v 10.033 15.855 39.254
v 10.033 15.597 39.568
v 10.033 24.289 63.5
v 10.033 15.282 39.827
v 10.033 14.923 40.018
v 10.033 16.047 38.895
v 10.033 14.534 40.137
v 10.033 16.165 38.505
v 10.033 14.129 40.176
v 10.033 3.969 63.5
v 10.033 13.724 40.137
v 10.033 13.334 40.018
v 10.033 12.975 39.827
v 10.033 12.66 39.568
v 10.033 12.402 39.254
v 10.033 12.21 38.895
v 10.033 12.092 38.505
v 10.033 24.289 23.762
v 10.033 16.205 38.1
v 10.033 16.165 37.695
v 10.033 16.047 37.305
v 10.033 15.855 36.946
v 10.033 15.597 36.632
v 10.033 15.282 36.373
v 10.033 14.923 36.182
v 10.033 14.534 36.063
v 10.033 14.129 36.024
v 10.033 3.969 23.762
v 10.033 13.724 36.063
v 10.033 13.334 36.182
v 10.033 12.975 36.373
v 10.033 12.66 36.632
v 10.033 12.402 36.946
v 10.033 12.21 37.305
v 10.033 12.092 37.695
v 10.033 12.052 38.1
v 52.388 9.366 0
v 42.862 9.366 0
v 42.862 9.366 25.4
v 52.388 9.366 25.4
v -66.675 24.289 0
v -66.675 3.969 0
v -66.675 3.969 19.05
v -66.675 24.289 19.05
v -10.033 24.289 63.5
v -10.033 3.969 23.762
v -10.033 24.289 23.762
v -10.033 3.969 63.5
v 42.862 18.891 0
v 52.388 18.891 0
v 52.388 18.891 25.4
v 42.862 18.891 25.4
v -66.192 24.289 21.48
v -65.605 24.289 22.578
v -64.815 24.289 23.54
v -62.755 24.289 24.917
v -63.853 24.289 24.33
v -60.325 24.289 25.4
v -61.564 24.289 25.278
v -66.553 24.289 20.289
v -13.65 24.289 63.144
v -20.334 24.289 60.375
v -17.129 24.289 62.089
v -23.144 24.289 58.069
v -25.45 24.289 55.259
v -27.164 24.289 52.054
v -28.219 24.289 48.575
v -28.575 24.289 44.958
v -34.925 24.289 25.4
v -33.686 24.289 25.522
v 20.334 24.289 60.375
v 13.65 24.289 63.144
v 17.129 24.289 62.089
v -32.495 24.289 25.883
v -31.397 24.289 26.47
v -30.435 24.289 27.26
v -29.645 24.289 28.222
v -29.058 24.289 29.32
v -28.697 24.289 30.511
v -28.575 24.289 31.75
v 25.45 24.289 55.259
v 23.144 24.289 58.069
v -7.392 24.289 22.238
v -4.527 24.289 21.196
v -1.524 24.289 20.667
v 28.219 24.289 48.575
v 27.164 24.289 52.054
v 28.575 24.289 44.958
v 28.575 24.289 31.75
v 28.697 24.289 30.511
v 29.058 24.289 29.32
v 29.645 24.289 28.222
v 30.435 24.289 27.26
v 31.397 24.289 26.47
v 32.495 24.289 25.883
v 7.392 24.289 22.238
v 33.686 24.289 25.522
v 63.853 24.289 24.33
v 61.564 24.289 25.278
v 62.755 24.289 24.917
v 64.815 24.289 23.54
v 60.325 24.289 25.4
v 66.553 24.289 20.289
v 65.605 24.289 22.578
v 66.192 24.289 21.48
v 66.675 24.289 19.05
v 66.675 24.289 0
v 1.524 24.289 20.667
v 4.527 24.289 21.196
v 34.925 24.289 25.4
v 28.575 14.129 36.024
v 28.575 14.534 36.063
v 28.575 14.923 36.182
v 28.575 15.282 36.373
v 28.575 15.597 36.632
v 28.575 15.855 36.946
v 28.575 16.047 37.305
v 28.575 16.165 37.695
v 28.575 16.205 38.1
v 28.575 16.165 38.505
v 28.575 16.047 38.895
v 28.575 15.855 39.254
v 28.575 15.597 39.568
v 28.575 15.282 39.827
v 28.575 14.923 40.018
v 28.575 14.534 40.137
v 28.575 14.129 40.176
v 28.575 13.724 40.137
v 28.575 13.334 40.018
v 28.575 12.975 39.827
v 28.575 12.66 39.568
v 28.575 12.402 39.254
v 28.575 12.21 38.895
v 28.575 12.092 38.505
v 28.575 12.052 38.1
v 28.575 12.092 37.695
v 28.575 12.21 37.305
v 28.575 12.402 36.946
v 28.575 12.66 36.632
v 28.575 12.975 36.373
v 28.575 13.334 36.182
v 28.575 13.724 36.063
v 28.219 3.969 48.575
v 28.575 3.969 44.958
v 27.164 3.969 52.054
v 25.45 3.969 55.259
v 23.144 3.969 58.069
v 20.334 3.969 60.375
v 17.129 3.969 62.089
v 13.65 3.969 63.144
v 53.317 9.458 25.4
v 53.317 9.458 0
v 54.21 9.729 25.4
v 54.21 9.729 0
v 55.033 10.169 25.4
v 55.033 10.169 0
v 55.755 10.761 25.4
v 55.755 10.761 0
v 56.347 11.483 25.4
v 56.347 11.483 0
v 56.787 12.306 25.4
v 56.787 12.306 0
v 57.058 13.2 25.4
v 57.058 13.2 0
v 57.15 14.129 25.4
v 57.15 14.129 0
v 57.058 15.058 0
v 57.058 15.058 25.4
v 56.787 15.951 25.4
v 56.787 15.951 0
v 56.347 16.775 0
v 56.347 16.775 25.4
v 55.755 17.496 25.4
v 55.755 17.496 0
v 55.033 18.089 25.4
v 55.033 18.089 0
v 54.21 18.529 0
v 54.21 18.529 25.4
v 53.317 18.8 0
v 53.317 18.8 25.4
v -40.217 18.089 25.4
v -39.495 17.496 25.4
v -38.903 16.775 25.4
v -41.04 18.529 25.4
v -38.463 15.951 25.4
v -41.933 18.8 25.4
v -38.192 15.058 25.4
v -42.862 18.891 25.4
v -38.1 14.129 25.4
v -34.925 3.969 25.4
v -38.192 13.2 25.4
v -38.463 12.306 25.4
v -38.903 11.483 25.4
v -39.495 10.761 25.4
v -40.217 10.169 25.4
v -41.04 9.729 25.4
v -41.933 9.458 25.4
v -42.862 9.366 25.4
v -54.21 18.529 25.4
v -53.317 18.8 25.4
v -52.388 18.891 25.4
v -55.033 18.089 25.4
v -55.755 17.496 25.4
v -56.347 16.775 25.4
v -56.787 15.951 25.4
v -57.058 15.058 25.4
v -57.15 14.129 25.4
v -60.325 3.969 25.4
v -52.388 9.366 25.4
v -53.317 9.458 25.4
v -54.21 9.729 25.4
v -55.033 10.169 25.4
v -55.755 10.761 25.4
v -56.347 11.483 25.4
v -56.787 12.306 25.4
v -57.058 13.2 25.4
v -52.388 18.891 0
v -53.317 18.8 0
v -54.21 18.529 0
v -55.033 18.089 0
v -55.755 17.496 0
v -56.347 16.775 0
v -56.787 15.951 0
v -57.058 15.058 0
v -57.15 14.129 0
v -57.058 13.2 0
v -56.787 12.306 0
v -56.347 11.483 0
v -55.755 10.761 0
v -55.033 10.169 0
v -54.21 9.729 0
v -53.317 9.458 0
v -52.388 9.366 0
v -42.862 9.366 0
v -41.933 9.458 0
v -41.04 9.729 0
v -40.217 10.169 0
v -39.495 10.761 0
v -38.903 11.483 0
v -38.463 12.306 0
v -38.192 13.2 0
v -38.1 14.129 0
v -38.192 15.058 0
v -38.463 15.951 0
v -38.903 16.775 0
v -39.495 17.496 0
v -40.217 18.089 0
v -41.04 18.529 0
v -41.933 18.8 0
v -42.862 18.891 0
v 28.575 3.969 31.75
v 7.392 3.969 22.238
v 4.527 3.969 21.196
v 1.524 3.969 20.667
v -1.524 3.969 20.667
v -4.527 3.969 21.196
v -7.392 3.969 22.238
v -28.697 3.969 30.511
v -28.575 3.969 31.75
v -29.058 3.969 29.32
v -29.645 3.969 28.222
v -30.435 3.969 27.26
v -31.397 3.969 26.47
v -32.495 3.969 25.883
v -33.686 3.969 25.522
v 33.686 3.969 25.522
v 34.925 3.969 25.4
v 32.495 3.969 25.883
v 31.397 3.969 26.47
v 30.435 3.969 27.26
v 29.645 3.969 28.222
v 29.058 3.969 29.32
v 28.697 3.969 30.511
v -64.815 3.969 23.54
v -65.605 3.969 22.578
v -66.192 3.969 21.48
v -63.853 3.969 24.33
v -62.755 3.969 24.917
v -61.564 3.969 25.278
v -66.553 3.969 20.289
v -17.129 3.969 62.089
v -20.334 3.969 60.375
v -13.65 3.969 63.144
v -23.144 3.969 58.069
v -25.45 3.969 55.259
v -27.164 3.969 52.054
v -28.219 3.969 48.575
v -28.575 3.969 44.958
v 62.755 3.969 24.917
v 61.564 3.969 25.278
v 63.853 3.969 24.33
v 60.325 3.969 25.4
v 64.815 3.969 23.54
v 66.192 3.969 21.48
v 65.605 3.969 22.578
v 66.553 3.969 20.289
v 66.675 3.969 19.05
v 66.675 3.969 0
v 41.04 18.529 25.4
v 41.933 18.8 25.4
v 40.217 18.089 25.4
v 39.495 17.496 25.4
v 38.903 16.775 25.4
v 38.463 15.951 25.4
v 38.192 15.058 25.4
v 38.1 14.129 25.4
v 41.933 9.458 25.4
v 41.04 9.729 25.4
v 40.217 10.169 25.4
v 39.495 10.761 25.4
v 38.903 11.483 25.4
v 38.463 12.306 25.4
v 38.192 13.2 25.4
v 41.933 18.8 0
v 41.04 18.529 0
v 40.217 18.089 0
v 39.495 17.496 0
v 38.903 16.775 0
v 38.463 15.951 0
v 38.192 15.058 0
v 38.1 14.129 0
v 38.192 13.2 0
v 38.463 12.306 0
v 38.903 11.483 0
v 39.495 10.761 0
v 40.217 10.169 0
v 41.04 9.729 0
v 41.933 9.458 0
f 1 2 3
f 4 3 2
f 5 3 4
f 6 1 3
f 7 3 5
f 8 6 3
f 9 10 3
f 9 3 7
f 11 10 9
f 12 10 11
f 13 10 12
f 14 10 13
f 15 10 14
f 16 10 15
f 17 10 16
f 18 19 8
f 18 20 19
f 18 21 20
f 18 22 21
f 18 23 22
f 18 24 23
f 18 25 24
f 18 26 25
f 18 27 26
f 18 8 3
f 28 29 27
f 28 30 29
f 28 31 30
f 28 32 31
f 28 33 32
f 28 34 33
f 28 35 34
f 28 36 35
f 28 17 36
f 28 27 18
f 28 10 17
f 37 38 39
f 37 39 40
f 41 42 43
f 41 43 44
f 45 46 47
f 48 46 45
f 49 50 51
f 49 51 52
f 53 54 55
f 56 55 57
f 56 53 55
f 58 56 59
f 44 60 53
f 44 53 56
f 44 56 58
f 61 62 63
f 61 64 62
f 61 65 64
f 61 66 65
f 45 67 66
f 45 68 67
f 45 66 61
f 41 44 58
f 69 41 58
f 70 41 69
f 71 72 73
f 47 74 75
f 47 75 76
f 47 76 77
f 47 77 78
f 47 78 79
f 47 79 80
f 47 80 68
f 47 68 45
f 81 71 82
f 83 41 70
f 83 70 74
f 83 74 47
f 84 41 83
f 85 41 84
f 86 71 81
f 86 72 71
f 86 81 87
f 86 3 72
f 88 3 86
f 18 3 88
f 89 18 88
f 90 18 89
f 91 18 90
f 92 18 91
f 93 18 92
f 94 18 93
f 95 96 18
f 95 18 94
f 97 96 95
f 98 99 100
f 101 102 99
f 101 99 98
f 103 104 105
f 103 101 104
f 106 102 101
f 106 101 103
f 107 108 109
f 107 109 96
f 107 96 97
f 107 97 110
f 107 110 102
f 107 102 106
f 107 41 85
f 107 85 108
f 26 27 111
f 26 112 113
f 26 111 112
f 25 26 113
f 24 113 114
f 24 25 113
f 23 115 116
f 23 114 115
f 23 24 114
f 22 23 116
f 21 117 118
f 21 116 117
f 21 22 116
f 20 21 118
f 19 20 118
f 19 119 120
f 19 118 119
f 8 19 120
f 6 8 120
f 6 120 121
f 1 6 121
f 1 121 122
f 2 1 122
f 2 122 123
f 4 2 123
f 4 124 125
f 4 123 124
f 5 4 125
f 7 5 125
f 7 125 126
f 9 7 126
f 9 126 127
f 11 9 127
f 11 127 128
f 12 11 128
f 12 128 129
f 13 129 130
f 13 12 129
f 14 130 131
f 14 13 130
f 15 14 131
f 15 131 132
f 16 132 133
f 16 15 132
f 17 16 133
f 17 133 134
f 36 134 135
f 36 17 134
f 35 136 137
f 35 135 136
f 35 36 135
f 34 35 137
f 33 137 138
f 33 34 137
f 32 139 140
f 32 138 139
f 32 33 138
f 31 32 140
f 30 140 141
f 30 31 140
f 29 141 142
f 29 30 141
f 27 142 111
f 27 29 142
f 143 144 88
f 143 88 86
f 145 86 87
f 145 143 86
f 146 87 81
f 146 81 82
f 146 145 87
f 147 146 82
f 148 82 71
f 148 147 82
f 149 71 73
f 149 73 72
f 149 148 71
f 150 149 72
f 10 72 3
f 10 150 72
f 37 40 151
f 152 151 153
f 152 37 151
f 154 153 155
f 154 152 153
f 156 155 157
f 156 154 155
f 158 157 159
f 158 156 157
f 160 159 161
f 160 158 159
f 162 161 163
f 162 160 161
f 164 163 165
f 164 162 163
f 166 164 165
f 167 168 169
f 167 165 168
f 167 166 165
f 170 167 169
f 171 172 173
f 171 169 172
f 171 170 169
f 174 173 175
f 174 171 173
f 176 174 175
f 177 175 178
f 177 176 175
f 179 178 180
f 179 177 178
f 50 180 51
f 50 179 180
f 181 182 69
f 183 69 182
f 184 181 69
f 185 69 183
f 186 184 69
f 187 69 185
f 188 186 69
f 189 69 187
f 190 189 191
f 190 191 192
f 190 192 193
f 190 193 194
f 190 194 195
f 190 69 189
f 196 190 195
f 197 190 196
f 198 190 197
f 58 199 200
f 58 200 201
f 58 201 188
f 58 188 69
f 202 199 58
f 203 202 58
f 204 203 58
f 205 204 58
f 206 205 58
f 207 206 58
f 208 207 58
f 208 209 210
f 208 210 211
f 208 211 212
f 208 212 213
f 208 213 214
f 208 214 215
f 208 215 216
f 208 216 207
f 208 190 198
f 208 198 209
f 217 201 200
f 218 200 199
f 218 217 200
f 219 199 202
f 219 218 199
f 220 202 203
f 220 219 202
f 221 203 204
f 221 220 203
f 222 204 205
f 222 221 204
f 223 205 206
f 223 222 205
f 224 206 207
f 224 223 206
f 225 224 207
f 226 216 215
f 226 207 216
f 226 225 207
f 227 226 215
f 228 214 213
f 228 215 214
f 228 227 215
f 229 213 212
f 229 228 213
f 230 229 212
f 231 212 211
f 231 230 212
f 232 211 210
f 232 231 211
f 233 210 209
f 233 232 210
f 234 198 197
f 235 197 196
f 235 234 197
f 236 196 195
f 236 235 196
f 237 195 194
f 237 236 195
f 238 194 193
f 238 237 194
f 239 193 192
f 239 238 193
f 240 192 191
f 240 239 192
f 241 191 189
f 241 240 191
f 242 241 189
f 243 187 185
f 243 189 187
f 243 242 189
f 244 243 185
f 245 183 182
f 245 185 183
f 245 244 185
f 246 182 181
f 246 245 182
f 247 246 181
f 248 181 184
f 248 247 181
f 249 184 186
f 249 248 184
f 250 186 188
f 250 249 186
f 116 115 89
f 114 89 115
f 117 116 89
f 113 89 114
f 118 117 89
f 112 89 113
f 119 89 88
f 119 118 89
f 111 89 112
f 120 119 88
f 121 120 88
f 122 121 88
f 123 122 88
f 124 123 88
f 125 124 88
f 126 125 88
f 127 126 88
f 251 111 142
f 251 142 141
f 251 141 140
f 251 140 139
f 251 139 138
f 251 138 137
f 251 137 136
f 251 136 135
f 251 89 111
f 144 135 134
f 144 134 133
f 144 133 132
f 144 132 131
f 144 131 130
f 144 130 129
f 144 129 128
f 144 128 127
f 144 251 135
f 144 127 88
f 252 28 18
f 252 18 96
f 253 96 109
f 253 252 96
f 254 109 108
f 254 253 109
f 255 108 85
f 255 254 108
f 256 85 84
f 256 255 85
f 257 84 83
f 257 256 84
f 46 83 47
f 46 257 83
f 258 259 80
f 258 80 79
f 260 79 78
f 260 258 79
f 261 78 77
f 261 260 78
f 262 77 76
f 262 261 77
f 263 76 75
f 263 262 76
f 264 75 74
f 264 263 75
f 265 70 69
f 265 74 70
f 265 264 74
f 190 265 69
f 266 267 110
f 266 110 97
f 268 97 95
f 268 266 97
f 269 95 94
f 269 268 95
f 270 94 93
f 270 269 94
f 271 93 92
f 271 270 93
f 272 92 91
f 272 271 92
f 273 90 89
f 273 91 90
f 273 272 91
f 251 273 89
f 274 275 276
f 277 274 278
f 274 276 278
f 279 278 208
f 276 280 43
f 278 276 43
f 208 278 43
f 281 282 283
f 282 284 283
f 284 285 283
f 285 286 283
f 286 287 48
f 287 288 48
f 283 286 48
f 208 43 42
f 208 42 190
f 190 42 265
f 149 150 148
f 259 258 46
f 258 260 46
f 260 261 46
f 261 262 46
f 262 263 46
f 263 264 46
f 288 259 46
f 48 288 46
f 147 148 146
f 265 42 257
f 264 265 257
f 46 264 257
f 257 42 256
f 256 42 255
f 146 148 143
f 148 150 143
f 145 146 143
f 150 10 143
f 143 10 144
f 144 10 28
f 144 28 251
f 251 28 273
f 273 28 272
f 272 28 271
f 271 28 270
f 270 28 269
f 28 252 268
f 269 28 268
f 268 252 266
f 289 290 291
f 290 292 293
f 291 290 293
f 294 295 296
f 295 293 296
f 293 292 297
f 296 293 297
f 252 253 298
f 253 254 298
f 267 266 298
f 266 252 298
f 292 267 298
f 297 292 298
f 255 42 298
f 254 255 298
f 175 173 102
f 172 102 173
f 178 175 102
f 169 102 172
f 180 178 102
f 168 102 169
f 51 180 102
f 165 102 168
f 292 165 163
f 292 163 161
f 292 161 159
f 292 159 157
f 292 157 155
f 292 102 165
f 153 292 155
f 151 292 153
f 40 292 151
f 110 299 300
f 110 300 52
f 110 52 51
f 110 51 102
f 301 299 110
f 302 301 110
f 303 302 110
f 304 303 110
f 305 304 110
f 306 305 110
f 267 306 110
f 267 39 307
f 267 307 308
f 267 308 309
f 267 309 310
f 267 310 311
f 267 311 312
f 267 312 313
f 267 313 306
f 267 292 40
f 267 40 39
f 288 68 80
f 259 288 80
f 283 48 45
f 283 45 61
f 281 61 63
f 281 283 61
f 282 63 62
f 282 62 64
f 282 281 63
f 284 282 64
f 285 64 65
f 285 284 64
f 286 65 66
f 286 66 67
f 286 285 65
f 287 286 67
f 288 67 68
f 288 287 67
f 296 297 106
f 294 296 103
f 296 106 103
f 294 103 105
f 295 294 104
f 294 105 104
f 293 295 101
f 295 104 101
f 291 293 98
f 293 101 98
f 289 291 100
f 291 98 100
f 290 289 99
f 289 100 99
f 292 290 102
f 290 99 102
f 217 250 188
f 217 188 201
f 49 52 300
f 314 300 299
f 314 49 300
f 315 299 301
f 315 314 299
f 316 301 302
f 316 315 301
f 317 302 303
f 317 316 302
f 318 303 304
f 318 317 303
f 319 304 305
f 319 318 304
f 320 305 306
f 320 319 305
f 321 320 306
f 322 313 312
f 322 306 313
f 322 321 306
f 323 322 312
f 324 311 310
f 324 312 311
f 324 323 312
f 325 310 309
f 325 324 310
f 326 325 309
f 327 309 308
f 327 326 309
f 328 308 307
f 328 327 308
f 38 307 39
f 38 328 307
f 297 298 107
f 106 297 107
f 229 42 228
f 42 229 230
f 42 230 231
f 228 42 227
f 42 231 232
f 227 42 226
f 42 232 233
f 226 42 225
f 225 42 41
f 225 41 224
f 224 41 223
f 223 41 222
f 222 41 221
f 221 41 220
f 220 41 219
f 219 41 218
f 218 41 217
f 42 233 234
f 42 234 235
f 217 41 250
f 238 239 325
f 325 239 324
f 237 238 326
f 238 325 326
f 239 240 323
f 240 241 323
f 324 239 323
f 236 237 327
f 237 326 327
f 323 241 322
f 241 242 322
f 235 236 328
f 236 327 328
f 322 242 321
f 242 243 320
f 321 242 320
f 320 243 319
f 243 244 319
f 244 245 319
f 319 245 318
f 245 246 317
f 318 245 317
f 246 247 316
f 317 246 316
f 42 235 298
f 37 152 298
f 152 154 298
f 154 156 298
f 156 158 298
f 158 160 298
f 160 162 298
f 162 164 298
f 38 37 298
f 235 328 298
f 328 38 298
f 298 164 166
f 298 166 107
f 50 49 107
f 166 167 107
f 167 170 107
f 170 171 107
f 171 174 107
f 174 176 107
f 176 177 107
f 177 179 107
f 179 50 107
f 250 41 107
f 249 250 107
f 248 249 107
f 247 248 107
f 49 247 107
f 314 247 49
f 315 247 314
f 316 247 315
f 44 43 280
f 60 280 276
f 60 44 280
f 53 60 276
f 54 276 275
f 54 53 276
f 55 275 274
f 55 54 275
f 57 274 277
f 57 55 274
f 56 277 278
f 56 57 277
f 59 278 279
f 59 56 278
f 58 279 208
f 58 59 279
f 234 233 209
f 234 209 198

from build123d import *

# Parameters (mm, degrees)
SKETCH1_W          = 133.35
SKETCH1_H          = 20.32
EXTRUDE1_DEPTH     = 63.5
CUT_EXTRUDE1_DEPTH = 21.32
FILLET1_R          = 6.35
CUT_EXTRUDE2_DEPTH = 64.5
SKETCH6_R          = 2.07645
CUT_EXTRUDE5_DEPTH = 67.675


with BuildPart() as part:
    # Sketch1 → Extrude1 (new body)
    with BuildSketch(Plane.XY):
        with Locations((0, 14.12875)):
            Rectangle(SKETCH1_W, SKETCH1_H)
    extrude(amount=EXTRUDE1_DEPTH)

    # Sketch2 → Cut-Extrude1 (cut, through all)
    with BuildSketch(Plane.XZ.offset(-3.96875)):
        with BuildLine():
            Line((-10.033, 23.761628021), (-10.033, 63.5))
            ThreePointArc((-10.033, 63.5), (-23.144173937, 58.069173937), (-28.575, 44.958))
            Line((-28.575, 44.958), (-28.575, 31.75))
            ThreePointArc((-28.575, 31.75), (-30.434871939, 27.259871939), (-34.925, 25.4))
            Line((-34.925, 25.4), (-66.675, 25.4))
            Line((-66.675, 25.4), (-66.675, 63.5))
            Line((-66.675, 63.5), (-66.675, 81.695932909))
            Line((-66.675, 81.695932909), (66.675, 81.695932909))
            Line((66.675, 81.695932909), (66.675, 63.5))
            Line((66.675, 63.5), (66.675, 25.4))
            Line((66.675, 25.4), (34.925, 25.4))
            ThreePointArc((34.925, 25.4), (30.434871939, 27.259871939), (28.575, 31.75))
            Line((28.575, 31.75), (28.575, 44.958))
            ThreePointArc((28.575, 44.958), (23.144173937, 58.069173937), (10.033, 63.5))
            Line((10.033, 63.5), (10.033, 23.761628021))
            ThreePointArc((10.033, 23.761628021), (0, 20.6), (-10.033, 23.761628021))
        make_face()
    extrude(amount=-CUT_EXTRUDE1_DEPTH, mode=Mode.SUBTRACT)

    # Fillet1
    fillet1_edges = [part.edges().sort_by_distance(p)[0] for p in [
        (-66.675, 14.12875, 25.4),
        (66.675, 14.12875, 25.4),
    ]]
    fillet(fillet1_edges, radius=FILLET1_R)

    # Sketch3 → Cut-Extrude2 (cut, through all)
    with BuildSketch(Plane(origin=(0, 0, 0), x_dir=(-1, 0, 0), z_dir=(0, 0, -1))):
        with BuildLine():
            Line((-52.3875, 18.89125), (-42.8625, 18.89125))
            ThreePointArc((-42.8625, 18.89125), (-38.1, 14.12875), (-42.8625, 9.36625))
            Line((-42.8625, 9.36625), (-52.3875, 9.36625))
            ThreePointArc((-52.3875, 9.36625), (-57.15, 14.12875), (-52.3875, 18.89125))
        make_face()
        with BuildLine():
            Line((52.3875, 9.36625), (42.8625, 9.36625))
            ThreePointArc((42.8625, 9.36625), (38.1, 14.12875), (42.8625, 18.89125))
            Line((42.8625, 18.89125), (52.3875, 18.89125))
            ThreePointArc((52.3875, 18.89125), (57.15, 14.12875), (52.3875, 9.36625))
        make_face()
    extrude(amount=-CUT_EXTRUDE2_DEPTH, mode=Mode.SUBTRACT)

    # Sketch6 → Cut-Extrude5 (cut, through all)
    with BuildSketch(Plane(origin=(0, 0, 0), x_dir=(0, 0, -1), z_dir=(1, 0, 0))):
        with Locations((-38.1, 14.12875)):
            Circle(SKETCH6_R)
    extrude(amount=CUT_EXTRUDE5_DEPTH, mode=Mode.SUBTRACT)


solid = part.part
